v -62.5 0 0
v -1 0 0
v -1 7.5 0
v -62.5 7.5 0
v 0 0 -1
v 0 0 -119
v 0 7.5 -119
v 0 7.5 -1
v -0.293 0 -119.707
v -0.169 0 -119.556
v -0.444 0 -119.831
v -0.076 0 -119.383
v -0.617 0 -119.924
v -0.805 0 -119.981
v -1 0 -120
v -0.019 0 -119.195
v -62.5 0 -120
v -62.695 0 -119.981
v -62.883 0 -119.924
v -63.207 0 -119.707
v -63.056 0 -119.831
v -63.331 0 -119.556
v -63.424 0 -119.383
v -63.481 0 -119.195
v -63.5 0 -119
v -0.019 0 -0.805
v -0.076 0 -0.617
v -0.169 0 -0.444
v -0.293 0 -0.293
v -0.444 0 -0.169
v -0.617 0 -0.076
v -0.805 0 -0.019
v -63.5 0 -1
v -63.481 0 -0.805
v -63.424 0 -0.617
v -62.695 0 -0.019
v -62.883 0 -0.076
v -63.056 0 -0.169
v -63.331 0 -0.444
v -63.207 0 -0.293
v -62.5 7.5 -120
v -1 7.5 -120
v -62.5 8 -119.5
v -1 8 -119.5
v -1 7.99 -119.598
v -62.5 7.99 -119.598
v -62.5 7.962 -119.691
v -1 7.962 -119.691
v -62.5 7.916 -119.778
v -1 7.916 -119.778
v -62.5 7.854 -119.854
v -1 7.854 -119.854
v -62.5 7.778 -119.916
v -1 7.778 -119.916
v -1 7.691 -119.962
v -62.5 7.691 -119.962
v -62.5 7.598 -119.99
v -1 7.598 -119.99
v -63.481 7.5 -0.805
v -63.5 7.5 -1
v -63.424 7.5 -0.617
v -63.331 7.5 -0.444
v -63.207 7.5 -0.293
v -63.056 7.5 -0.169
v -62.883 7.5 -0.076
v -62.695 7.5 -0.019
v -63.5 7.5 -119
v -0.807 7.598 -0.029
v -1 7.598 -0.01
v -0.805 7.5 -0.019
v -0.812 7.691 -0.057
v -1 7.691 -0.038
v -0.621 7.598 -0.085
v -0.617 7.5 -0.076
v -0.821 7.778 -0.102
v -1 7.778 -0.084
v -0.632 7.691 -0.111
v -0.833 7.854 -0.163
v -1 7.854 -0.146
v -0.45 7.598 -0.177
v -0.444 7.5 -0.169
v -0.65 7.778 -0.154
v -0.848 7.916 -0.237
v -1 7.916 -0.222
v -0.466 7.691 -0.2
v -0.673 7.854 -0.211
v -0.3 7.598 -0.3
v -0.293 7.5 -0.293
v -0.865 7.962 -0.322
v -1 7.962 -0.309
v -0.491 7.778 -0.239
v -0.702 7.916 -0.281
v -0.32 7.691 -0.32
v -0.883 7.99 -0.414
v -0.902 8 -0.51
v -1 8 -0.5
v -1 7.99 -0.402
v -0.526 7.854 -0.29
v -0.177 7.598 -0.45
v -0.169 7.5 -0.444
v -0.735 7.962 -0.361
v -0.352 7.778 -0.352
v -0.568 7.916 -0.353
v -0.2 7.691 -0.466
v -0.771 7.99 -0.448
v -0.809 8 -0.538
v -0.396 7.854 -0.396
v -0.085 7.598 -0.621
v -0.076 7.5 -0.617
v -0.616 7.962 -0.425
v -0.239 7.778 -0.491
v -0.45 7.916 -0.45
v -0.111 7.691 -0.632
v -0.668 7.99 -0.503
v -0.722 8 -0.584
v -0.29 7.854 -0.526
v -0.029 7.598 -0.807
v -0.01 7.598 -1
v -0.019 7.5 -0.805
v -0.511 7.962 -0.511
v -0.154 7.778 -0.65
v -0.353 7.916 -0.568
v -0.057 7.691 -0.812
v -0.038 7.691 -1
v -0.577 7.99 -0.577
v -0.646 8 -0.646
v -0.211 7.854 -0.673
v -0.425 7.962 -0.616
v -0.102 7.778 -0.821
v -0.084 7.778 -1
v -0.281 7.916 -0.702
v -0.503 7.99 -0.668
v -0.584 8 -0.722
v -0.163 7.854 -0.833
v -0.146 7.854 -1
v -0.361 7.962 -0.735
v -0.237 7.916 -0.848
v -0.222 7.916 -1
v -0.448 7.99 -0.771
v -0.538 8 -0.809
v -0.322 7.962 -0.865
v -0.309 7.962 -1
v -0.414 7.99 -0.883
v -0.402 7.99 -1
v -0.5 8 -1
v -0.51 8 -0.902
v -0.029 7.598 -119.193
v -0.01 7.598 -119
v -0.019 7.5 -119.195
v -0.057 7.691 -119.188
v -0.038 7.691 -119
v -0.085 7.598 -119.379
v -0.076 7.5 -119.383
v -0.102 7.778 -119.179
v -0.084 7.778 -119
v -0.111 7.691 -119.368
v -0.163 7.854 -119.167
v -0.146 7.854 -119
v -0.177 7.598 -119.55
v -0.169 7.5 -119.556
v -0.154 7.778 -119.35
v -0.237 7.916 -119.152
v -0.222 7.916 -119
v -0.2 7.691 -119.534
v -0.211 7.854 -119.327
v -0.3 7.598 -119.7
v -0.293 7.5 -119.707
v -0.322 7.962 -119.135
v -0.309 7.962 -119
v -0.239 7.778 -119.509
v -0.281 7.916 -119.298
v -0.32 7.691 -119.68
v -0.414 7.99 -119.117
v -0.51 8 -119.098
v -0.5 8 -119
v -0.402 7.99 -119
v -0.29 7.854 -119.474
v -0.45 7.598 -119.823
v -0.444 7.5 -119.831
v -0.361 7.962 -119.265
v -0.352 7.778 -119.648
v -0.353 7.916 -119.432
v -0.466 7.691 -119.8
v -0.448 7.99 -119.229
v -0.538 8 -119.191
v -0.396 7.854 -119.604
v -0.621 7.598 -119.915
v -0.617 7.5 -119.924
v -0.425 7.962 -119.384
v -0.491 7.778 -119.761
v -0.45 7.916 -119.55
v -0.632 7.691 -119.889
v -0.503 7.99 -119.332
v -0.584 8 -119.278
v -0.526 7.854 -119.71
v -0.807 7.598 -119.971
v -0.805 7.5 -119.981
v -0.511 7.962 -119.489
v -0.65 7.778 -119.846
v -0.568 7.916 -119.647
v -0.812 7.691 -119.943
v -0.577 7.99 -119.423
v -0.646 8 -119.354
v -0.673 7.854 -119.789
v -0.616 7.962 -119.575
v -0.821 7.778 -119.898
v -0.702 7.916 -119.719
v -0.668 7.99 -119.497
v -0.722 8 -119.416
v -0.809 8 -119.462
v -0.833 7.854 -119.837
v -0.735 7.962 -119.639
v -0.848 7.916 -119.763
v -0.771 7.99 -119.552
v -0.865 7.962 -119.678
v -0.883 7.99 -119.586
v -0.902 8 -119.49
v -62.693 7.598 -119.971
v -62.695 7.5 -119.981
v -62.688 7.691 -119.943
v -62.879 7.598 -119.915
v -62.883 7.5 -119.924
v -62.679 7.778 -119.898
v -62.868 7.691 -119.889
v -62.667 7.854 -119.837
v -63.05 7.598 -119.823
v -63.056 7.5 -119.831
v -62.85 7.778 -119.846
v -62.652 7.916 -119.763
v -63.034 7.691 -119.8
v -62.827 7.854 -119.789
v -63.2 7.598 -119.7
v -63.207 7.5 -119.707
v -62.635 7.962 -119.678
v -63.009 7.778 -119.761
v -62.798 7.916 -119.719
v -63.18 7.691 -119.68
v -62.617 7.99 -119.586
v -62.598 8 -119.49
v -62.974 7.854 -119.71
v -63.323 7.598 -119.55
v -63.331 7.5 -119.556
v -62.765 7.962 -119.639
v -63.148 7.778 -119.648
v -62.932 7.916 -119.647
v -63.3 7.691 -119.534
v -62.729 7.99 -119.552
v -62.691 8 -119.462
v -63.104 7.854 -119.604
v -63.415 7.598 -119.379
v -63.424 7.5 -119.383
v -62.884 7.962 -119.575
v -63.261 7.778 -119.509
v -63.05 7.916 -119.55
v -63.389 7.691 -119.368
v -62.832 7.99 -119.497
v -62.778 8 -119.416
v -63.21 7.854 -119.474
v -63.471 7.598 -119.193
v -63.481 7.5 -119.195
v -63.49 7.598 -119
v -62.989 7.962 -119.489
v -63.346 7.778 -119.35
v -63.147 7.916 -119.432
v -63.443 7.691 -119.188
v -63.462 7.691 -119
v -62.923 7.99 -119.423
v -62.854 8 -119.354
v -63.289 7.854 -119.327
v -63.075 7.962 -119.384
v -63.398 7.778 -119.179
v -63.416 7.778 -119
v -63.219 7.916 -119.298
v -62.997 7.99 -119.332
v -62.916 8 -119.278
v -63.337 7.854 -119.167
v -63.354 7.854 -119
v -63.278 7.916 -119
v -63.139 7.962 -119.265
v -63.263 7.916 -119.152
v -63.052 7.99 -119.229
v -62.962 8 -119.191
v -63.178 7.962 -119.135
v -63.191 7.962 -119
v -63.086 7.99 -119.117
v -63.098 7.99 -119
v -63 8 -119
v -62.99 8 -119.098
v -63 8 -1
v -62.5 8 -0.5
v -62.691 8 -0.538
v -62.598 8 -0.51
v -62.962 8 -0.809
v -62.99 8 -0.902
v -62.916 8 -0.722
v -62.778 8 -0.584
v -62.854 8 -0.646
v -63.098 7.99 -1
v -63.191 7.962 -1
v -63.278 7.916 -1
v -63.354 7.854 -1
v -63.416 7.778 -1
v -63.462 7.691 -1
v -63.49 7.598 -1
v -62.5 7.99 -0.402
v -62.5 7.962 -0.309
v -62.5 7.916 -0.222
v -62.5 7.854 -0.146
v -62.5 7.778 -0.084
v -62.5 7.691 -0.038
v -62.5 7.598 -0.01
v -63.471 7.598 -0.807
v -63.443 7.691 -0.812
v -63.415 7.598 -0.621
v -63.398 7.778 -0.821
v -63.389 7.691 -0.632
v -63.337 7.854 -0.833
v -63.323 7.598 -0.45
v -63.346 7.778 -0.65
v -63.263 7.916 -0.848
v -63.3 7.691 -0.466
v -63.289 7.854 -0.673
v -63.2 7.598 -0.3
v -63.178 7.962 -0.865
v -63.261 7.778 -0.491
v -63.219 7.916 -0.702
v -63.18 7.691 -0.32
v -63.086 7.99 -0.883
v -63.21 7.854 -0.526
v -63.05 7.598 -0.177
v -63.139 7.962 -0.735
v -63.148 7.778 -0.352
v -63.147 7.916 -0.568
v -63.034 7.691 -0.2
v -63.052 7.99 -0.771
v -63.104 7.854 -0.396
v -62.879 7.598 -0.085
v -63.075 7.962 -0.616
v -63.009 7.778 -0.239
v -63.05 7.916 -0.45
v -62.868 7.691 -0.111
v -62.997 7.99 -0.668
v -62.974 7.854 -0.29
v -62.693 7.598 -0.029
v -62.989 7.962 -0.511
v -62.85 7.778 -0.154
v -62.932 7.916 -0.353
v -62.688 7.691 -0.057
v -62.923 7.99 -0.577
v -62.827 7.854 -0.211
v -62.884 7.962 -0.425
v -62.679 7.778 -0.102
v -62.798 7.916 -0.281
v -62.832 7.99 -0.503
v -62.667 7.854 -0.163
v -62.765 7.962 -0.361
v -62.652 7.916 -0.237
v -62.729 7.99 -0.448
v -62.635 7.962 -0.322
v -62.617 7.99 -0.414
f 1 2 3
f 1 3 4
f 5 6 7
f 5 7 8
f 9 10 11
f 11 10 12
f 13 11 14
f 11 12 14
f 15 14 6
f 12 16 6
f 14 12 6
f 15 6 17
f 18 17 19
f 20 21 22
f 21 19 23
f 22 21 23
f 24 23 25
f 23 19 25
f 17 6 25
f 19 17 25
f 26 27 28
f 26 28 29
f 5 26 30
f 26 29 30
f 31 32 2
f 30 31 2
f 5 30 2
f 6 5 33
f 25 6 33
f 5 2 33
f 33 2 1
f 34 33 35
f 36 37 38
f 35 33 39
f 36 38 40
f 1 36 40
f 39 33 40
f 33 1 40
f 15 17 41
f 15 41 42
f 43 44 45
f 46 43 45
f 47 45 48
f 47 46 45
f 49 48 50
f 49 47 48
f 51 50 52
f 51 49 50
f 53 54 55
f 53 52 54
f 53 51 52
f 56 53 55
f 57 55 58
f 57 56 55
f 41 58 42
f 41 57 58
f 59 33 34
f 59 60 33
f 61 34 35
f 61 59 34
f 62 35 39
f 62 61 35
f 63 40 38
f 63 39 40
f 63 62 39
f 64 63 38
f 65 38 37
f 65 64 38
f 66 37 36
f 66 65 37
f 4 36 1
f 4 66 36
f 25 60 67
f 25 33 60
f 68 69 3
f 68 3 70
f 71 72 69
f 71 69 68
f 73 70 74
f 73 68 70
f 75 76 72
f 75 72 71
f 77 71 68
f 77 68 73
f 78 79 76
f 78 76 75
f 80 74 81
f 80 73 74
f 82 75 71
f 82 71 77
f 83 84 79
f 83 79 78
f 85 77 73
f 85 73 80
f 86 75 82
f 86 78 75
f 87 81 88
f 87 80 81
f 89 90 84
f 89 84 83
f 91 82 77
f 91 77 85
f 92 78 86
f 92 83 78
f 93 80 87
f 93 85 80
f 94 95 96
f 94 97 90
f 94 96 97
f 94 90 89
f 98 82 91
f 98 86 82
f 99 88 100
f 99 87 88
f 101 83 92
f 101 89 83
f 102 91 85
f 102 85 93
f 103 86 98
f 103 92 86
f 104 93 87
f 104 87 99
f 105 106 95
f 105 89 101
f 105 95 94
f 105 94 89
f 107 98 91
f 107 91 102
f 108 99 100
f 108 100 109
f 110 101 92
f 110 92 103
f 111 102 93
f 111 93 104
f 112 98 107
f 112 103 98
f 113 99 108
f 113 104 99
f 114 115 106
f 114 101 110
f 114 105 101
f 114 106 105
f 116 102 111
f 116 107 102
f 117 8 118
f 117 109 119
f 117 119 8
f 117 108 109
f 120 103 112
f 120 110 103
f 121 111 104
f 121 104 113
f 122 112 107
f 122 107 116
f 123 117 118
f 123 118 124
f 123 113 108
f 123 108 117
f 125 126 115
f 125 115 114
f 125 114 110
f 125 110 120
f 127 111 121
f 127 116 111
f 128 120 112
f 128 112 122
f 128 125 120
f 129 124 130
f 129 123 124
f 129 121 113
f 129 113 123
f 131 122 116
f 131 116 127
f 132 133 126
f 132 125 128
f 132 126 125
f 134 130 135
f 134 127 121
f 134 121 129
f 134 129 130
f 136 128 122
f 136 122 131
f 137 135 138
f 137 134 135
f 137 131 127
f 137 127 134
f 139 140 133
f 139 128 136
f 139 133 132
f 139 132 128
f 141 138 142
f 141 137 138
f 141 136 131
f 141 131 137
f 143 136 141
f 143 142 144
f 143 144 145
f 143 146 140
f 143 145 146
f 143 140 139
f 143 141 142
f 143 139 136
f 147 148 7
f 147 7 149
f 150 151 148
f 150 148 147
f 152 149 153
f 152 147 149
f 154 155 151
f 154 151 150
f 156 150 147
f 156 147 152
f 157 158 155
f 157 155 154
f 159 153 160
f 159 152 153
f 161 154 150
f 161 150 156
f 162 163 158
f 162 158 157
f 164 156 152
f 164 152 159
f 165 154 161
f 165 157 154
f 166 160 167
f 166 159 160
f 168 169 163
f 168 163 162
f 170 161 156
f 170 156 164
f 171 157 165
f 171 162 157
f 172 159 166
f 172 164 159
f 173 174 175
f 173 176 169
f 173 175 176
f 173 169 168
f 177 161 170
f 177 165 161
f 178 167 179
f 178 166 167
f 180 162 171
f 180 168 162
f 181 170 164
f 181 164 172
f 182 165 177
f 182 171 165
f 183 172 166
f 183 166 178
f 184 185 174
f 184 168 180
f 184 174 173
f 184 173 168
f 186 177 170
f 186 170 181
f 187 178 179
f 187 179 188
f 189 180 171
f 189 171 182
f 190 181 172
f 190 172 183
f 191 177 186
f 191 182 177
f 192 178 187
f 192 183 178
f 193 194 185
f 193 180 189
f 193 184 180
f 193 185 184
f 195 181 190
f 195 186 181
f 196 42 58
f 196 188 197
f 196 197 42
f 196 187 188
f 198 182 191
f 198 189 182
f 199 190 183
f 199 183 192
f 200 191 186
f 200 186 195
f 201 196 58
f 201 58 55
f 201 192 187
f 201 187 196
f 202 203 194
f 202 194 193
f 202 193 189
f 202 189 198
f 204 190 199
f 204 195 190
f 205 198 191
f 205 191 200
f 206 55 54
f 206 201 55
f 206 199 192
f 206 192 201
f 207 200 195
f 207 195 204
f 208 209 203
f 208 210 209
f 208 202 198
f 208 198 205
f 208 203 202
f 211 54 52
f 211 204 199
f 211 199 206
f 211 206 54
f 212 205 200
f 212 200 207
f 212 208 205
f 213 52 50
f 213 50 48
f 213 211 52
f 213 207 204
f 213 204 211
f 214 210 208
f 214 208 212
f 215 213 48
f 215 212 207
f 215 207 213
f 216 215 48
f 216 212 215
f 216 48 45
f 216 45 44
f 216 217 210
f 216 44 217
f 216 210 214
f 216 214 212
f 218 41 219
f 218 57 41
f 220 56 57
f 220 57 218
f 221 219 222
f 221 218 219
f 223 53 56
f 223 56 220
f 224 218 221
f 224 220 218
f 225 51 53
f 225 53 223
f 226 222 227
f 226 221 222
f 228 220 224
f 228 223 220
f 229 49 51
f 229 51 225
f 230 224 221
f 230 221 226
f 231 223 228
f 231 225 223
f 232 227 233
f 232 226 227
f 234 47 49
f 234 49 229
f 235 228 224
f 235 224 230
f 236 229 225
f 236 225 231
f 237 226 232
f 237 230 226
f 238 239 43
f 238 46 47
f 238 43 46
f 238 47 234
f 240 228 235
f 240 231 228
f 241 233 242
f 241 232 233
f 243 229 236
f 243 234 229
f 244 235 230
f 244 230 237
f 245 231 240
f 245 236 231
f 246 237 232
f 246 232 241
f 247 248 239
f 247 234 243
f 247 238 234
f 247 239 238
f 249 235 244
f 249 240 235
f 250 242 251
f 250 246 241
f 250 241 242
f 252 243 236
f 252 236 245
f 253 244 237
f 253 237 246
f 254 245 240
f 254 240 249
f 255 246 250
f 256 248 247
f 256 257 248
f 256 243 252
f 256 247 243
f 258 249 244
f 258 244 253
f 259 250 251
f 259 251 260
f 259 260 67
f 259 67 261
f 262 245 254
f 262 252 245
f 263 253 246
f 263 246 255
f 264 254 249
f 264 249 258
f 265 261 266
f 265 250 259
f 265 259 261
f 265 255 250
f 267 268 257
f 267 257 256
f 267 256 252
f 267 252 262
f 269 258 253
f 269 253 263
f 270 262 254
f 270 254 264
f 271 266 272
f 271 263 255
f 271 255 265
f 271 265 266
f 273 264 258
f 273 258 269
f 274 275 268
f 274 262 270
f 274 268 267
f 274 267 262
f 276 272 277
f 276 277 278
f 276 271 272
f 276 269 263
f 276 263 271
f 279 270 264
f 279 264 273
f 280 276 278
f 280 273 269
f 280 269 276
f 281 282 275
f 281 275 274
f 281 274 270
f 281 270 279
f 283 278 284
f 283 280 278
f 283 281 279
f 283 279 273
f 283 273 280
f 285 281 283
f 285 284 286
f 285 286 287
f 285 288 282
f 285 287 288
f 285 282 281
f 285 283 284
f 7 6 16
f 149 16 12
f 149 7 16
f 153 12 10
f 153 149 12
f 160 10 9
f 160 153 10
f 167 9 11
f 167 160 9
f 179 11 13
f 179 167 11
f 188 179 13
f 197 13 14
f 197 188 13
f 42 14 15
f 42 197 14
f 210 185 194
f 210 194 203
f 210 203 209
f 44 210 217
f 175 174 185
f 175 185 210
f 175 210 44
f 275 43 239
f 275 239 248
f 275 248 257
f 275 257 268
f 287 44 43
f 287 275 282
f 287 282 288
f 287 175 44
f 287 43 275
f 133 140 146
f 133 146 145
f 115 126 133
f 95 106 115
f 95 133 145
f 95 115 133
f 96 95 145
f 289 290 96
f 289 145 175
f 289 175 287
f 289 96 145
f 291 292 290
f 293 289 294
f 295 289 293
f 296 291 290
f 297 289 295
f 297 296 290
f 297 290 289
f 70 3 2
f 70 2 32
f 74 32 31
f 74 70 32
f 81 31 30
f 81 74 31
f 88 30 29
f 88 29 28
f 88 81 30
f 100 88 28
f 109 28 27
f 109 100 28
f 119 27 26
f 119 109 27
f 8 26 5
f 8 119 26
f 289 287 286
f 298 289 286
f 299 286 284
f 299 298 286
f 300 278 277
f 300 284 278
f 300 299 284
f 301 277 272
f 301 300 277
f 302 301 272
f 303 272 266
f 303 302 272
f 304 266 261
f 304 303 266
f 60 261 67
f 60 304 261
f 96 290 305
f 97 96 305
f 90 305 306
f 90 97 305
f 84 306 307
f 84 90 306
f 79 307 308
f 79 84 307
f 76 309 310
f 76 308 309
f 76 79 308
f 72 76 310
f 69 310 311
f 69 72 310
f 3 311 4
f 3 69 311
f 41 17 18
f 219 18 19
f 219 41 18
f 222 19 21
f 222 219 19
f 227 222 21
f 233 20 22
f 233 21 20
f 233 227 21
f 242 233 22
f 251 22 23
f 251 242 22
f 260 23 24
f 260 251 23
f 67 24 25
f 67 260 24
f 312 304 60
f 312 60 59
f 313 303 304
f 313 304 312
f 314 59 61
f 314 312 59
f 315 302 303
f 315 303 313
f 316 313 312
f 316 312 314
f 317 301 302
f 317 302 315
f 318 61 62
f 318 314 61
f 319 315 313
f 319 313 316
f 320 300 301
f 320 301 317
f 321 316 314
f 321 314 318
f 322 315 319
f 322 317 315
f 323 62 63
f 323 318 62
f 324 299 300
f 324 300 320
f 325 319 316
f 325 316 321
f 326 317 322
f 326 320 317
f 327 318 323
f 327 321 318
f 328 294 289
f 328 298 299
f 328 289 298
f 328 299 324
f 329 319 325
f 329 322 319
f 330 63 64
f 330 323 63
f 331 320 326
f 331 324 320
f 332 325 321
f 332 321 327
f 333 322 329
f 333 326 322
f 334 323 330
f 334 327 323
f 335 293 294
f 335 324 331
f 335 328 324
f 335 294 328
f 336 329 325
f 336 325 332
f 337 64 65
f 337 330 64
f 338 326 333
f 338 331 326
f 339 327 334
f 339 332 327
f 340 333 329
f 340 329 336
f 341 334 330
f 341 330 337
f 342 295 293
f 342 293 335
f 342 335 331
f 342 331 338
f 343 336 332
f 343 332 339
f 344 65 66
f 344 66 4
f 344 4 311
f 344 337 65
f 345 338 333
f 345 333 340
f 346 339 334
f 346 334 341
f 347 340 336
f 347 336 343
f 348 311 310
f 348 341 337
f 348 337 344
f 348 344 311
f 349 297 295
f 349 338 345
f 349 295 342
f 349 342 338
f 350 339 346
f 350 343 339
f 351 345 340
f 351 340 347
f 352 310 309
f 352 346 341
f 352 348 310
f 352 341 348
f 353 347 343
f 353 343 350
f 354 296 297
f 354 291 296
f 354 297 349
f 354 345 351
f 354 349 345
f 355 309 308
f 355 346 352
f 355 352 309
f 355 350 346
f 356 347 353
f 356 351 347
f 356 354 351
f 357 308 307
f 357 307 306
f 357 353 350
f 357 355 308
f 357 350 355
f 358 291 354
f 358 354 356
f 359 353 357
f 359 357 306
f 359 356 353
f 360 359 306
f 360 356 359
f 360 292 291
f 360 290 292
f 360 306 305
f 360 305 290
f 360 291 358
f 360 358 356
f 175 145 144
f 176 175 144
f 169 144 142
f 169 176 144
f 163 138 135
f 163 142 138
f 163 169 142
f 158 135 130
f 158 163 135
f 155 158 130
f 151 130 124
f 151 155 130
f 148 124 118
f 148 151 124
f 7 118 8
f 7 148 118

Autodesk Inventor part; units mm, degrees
ref_plane "YZ Plane" through (0, 0, 0) normal (1, 0, 0) x (0, 1, 0)
ref_plane "XZ Plane" through (0, 0, 0) normal (0, 1, 0) x (-1, 0, 0)
ref_plane "XY Plane" through (0, 0, 0) normal (0, 0, 1) x (1, 0, 0)
sketch "Sketch1" plane through (0, 0, 0) normal (0, 1, 0) x (-1, 0, 0)
  line L0 (0, 0) -> (63.5, 0)
  line L1 (63.5, 0) -> (63.5, -120)
  line L2 (63.5, -120) -> (0, -120)
  line L3 (0, -120) -> (0, 0)
  dimension "d0" = 63.5
  dimension "d1" = 120
extrude "Extrusion1" add sketch "Sketch1" along normal blind 8
fillet "Fillet1" radius 1 4 edges at (0, 4, 0) (-63.5, 4, 0) (-63.5, 4, -120) (0, 4, -120)
fillet "Fillet2" radius 0.5 8 edges at (-0.2929, 8, -0.2929) (0, 8, -60) (-0.2929, 8, -119.7071) (-31.75, 8, -120) (-63.2071, 8, -119.7071) (-63.5, 8, -60) (-63.2071, 8, -0.2929) (-31.75, 8, 0)
properties part number "BMS"
